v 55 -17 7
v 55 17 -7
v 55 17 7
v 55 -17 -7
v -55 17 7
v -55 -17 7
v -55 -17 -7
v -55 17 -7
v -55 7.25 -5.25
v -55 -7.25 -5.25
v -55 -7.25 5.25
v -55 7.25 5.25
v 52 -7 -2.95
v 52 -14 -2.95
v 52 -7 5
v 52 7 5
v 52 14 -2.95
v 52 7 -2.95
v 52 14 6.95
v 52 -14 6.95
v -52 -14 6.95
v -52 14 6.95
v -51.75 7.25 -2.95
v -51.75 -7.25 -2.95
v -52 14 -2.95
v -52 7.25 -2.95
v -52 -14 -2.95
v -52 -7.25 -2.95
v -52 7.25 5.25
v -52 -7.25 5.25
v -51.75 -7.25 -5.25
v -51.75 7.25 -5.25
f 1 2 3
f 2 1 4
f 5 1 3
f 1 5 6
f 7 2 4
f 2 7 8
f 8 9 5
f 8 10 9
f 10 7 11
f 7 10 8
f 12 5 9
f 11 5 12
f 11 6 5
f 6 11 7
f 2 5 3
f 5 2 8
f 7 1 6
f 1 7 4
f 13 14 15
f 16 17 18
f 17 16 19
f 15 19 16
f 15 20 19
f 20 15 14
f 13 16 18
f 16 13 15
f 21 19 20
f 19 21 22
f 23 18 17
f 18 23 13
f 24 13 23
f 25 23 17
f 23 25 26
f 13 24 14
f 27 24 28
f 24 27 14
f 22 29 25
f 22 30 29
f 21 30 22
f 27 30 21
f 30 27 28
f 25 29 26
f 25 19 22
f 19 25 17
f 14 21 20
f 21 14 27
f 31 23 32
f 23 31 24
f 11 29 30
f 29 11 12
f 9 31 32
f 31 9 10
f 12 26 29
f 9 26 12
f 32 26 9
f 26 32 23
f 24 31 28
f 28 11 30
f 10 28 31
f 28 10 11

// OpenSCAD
// TS-PET-C06 - Straight Track Segment
$fn = 72; seg_len = 110; outer_w = 34; track_h = 14; floor_t = 2; roof_t = 2.2; wall_t = 3; join_w = 14; join_t = 3; join_h = 10;
difference(){ cube([seg_len, outer_w, track_h], center=true); translate([0,0,floor_t]) cube([seg_len-2*wall_t, outer_w-2*wall_t, track_h-floor_t-roof_t+0.1], center=true); translate([-seg_len/2+join_t/2,0,0]) cube([join_t+0.5, join_w+0.5, join_h+0.5], center=true);} translate([seg_len/2-join_t/2,0,0]) cube([join_t, join_w, join_h], center=true);
